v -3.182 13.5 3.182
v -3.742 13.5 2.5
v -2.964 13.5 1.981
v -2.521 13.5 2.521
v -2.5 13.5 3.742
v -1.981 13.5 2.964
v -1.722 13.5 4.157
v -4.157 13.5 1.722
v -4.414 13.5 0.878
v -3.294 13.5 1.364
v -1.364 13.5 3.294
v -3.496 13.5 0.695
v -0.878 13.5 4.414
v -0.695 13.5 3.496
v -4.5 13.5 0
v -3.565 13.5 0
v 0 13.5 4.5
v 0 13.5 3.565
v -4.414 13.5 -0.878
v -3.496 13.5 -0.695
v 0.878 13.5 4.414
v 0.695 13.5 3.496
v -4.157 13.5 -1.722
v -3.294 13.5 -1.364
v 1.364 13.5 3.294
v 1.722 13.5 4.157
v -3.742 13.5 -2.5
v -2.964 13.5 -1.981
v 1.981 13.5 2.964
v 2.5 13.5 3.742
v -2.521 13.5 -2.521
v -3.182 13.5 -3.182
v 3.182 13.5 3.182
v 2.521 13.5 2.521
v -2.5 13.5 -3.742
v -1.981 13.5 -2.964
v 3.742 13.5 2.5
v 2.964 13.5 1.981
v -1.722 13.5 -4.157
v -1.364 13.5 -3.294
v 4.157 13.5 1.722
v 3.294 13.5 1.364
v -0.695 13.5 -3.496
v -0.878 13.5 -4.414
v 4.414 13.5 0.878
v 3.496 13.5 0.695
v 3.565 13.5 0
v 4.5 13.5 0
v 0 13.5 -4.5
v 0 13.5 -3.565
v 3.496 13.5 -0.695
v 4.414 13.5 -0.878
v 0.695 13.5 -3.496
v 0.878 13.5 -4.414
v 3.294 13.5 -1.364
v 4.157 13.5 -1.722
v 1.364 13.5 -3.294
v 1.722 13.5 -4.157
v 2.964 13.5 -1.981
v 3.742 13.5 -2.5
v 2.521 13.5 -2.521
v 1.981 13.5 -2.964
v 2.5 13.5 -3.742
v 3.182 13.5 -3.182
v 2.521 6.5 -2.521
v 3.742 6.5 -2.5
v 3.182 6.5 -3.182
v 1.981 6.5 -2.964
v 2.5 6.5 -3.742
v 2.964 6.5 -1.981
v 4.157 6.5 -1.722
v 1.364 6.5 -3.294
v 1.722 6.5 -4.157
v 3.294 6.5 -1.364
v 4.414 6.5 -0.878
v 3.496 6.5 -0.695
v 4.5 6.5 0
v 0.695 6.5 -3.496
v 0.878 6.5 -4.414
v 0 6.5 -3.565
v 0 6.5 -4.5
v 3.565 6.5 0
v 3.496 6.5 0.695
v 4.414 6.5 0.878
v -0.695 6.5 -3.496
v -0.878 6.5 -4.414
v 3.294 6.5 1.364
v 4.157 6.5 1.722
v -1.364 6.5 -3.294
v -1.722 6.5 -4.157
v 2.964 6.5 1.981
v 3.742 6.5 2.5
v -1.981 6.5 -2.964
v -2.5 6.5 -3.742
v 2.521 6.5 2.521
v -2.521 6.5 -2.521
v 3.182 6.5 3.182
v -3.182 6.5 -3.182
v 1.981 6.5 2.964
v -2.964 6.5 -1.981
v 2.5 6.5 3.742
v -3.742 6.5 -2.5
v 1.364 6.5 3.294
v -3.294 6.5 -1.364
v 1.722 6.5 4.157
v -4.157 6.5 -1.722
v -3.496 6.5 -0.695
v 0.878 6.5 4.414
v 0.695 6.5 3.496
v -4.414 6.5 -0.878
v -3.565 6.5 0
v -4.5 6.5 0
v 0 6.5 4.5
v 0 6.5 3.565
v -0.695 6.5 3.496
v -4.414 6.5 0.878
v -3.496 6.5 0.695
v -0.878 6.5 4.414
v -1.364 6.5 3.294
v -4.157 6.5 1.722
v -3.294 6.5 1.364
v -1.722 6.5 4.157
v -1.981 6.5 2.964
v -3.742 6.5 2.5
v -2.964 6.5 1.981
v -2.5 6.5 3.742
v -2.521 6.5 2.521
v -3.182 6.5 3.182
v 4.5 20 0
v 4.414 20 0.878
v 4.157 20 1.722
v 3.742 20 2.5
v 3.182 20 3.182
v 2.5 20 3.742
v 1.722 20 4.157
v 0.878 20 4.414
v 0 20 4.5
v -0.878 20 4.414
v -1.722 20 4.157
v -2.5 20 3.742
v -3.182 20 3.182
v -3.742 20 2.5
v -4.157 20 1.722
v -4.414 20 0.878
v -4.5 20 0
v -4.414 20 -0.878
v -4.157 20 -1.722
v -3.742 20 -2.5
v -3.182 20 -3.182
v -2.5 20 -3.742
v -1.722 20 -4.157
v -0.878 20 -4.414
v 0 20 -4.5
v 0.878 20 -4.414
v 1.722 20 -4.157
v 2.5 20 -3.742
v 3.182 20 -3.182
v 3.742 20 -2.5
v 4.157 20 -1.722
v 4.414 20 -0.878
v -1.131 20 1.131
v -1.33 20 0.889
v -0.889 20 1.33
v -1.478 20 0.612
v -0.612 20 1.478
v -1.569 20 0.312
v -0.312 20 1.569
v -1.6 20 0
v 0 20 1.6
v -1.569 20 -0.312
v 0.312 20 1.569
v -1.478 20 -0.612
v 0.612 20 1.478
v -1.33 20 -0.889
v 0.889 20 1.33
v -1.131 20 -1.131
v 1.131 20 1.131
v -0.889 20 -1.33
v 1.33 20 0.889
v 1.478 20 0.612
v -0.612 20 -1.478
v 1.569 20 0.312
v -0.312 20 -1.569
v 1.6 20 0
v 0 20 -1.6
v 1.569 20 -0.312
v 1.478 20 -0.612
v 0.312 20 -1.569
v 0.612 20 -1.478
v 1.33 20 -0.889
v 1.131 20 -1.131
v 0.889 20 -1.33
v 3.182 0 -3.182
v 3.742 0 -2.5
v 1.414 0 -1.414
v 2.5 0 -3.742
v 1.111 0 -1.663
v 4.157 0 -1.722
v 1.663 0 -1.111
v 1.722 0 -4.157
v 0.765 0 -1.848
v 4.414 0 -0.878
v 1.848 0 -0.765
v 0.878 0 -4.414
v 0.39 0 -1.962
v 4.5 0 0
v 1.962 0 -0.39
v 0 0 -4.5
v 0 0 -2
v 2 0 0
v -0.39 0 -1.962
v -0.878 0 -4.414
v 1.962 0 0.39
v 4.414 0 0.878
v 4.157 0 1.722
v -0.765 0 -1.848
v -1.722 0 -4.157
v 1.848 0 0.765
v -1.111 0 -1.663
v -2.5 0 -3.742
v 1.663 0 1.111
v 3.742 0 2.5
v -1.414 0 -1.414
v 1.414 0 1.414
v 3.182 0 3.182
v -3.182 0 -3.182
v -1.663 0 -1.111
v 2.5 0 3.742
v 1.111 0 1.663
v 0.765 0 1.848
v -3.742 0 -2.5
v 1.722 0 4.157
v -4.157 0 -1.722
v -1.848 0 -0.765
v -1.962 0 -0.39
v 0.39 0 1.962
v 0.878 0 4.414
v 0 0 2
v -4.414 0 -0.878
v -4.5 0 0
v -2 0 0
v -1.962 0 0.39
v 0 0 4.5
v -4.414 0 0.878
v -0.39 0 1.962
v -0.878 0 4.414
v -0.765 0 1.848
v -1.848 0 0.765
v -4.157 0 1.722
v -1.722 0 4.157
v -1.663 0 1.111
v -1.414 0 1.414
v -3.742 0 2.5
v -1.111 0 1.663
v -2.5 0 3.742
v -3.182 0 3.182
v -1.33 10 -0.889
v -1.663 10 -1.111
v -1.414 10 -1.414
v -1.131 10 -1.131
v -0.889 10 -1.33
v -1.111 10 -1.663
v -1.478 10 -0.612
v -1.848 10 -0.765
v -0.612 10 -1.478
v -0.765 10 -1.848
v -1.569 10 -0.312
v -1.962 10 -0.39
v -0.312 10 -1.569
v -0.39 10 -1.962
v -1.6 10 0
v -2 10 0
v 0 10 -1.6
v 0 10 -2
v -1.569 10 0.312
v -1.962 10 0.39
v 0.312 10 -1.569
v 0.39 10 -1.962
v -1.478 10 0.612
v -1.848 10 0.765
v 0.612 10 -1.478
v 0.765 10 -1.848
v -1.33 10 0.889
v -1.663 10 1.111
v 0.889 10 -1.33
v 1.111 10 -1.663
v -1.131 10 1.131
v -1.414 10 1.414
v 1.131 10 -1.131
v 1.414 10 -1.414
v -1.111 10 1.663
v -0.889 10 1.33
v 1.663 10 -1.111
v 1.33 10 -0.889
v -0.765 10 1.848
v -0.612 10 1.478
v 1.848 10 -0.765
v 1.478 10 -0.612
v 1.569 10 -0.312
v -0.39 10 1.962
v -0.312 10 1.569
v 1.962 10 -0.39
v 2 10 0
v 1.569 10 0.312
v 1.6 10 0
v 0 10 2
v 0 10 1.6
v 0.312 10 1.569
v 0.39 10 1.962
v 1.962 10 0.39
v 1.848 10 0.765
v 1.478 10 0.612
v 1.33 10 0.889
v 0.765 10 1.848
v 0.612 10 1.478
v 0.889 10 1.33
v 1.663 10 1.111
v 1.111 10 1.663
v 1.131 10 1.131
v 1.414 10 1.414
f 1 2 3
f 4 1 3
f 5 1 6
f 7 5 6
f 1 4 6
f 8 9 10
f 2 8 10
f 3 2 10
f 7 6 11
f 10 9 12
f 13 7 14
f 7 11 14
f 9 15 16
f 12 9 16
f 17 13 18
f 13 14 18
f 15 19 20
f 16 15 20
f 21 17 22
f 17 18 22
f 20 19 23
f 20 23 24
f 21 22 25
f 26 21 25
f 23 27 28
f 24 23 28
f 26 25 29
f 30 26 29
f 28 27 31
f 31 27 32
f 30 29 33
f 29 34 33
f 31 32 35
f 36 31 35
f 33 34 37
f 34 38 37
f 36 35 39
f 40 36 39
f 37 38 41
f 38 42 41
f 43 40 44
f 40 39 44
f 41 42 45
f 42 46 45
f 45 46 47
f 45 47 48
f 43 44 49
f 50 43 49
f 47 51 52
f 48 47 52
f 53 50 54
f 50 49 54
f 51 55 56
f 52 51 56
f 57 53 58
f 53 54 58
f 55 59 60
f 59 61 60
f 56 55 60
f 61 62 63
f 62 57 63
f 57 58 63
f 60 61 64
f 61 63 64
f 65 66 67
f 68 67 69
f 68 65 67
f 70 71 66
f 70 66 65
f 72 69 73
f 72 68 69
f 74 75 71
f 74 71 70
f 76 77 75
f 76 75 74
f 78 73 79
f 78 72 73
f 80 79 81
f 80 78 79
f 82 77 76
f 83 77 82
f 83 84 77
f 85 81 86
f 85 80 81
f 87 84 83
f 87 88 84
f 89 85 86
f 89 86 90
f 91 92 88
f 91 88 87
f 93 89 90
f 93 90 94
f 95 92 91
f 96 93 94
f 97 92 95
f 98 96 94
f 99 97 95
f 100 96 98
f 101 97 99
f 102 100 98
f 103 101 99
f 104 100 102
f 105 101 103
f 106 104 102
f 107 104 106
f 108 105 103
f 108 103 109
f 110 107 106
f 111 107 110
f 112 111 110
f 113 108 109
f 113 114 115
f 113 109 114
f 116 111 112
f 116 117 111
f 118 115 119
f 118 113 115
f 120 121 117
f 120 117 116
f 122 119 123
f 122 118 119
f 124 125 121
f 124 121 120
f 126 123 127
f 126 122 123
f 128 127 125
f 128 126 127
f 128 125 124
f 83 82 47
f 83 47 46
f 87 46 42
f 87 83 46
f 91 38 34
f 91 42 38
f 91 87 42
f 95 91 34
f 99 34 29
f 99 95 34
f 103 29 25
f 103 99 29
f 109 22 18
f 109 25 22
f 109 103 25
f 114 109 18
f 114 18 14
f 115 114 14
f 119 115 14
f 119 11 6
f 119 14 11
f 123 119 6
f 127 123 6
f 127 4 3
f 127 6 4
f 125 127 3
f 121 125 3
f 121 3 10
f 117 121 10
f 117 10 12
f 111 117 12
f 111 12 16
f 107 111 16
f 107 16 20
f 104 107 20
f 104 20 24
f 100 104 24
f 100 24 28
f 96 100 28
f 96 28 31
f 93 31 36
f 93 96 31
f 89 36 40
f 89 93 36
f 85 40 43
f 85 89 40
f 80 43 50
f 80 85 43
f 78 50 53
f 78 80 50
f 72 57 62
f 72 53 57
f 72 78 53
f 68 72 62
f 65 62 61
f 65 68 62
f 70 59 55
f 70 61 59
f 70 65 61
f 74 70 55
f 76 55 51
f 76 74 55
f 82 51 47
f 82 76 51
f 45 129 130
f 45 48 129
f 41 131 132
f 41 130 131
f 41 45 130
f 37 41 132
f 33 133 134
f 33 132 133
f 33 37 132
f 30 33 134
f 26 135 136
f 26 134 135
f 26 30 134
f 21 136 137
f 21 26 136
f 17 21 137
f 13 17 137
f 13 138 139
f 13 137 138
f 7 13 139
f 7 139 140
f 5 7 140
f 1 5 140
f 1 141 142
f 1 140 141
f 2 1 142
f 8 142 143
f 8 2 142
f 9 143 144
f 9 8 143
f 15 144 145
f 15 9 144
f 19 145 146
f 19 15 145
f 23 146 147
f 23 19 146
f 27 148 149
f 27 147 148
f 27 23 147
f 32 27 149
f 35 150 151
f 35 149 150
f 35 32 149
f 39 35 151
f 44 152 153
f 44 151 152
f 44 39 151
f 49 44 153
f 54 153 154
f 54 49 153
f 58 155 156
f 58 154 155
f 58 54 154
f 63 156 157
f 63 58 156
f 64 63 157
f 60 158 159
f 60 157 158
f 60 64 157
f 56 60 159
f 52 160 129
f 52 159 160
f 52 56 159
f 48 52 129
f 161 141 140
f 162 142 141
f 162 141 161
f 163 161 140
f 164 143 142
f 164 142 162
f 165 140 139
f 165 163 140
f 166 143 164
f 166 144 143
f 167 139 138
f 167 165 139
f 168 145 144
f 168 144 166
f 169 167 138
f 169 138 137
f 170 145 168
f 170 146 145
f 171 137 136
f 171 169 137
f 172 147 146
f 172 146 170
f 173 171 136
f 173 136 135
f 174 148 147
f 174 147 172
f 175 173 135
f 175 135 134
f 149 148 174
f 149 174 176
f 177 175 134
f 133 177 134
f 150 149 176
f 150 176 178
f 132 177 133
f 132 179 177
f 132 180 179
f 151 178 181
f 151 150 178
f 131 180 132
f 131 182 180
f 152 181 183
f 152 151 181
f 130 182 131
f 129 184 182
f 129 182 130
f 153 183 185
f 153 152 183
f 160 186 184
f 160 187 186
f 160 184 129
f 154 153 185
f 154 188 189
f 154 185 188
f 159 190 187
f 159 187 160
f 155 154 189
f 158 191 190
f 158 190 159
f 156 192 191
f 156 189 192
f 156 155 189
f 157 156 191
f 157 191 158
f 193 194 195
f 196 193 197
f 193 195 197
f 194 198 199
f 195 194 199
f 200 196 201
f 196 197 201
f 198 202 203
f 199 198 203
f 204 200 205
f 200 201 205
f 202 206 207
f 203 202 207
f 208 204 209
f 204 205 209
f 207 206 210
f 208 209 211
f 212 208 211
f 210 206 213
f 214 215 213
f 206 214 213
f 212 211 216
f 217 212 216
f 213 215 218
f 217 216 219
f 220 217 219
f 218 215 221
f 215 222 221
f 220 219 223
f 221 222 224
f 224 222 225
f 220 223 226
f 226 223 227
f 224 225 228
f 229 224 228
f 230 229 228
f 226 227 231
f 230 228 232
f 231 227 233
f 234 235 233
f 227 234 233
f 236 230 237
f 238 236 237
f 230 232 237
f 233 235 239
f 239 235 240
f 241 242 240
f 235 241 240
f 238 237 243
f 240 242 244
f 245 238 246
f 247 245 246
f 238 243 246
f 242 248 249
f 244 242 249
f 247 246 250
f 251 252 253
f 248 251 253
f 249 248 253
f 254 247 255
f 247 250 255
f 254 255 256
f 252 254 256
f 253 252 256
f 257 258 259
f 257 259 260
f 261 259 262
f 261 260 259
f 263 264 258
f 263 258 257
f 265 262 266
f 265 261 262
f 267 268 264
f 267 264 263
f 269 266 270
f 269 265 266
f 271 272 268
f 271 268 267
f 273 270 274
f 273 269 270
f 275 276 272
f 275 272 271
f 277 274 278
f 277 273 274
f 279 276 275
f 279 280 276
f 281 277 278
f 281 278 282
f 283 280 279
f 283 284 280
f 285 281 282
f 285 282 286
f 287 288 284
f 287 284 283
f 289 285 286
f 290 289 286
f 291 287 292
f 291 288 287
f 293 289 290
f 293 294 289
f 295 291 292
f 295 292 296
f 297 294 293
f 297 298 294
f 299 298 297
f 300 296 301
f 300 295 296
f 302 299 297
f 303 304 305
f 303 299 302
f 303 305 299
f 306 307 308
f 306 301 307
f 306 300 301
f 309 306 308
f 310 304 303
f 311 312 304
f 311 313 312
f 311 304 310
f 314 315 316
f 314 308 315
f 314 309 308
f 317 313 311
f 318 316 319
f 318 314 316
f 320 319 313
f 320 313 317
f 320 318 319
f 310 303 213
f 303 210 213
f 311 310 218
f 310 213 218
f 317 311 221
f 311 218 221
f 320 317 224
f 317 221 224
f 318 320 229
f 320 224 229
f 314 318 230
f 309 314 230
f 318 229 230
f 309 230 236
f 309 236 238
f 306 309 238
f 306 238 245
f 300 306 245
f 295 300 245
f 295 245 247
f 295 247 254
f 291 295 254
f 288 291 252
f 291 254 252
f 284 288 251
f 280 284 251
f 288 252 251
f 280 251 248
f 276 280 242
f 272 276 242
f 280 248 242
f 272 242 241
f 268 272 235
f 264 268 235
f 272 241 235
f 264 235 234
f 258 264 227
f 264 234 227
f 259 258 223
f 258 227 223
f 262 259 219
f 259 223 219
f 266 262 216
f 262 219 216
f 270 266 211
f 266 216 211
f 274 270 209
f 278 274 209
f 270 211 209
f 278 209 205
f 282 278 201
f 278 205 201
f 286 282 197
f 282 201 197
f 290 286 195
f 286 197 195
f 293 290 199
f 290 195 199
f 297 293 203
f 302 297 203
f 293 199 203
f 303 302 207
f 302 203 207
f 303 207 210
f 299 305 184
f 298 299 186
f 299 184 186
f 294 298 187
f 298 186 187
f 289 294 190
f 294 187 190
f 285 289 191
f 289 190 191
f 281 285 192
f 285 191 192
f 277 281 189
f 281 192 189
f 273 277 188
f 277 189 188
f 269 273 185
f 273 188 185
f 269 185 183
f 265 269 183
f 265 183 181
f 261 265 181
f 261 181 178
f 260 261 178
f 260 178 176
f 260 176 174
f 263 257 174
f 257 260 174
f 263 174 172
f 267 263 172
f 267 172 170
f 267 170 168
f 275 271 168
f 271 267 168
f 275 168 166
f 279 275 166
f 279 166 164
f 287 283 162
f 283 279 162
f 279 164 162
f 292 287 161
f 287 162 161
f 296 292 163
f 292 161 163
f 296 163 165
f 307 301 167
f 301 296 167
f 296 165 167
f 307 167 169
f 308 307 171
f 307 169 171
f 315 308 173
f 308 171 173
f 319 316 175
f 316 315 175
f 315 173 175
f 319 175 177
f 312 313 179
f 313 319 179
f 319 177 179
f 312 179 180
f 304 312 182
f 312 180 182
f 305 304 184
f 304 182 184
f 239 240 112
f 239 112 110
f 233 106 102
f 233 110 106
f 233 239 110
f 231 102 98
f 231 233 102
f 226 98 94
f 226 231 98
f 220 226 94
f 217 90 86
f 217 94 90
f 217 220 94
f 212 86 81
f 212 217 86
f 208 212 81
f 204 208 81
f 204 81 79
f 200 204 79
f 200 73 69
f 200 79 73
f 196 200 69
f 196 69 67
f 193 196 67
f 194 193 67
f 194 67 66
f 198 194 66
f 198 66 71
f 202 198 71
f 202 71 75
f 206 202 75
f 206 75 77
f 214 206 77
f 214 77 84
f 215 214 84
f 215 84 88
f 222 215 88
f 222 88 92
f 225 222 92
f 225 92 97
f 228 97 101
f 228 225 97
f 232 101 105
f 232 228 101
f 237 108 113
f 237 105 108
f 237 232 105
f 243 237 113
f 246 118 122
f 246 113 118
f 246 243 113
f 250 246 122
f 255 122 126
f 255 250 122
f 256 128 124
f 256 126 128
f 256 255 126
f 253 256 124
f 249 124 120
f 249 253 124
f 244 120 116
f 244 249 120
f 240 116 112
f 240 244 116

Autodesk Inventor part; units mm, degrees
ref_plane "YZ Plane" through (0, 0, 0) normal (1, 0, 0) x (0, 1, 0)
ref_plane "XZ Plane" through (0, 0, 0) normal (0, 1, 0) x (-1, 0, 0)
ref_plane "XY Plane" through (0, 0, 0) normal (0, 0, 1) x (1, 0, 0)
sketch "Sketch1" plane through (0, 0, 0) normal (0, 1, 0) x (-1, 0, 0)
  circle A0 centre (0, 0) radius 4.5
  dimension "d0" = 9
extrude "Extrusion1" add sketch "Sketch1" along normal blind 6.5
sketch "Sketch2" plane through (0, 6.5, 0) normal (0, 1, 0) x (1, 0, 0)
  circle A0 centre (0, 0) radius 3.565
  dimension "d3" = 7.13
extrude "Extrusion2" add sketch "Sketch2" along normal blind 7
sketch "Sketch3" plane through (0, 13.5, 0) normal (0, 1, 0) x (1, 0, 0)
  circle A0 centre (0, 0) radius 4.5
  dimension "d6" = 9
extrude "Extrusion3" add sketch "Sketch3" along normal blind 6.5
sketch "Sketch4" plane through (0, 20, 0) normal (0, 1, 0) x (1, 0, 0)
  circle A0 centre (0, 0) radius 1.6
  dimension "d9" = 3.2
extrude "Extrusion4" cut sketch "Sketch4" against normal blind 20
sketch "Sketch5" plane through (0, 0, 0) normal (0, -1, 0) x (1, 0, 0)
  circle A0 centre (0, 0) radius 1.6 projected
  circle A1 centre (0, 0) radius 2
  dimension "d12" = 4
extrude "Extrusion5" cut sketch "Sketch5" against normal blind 10
properties part number "coupler" material "Gold"
